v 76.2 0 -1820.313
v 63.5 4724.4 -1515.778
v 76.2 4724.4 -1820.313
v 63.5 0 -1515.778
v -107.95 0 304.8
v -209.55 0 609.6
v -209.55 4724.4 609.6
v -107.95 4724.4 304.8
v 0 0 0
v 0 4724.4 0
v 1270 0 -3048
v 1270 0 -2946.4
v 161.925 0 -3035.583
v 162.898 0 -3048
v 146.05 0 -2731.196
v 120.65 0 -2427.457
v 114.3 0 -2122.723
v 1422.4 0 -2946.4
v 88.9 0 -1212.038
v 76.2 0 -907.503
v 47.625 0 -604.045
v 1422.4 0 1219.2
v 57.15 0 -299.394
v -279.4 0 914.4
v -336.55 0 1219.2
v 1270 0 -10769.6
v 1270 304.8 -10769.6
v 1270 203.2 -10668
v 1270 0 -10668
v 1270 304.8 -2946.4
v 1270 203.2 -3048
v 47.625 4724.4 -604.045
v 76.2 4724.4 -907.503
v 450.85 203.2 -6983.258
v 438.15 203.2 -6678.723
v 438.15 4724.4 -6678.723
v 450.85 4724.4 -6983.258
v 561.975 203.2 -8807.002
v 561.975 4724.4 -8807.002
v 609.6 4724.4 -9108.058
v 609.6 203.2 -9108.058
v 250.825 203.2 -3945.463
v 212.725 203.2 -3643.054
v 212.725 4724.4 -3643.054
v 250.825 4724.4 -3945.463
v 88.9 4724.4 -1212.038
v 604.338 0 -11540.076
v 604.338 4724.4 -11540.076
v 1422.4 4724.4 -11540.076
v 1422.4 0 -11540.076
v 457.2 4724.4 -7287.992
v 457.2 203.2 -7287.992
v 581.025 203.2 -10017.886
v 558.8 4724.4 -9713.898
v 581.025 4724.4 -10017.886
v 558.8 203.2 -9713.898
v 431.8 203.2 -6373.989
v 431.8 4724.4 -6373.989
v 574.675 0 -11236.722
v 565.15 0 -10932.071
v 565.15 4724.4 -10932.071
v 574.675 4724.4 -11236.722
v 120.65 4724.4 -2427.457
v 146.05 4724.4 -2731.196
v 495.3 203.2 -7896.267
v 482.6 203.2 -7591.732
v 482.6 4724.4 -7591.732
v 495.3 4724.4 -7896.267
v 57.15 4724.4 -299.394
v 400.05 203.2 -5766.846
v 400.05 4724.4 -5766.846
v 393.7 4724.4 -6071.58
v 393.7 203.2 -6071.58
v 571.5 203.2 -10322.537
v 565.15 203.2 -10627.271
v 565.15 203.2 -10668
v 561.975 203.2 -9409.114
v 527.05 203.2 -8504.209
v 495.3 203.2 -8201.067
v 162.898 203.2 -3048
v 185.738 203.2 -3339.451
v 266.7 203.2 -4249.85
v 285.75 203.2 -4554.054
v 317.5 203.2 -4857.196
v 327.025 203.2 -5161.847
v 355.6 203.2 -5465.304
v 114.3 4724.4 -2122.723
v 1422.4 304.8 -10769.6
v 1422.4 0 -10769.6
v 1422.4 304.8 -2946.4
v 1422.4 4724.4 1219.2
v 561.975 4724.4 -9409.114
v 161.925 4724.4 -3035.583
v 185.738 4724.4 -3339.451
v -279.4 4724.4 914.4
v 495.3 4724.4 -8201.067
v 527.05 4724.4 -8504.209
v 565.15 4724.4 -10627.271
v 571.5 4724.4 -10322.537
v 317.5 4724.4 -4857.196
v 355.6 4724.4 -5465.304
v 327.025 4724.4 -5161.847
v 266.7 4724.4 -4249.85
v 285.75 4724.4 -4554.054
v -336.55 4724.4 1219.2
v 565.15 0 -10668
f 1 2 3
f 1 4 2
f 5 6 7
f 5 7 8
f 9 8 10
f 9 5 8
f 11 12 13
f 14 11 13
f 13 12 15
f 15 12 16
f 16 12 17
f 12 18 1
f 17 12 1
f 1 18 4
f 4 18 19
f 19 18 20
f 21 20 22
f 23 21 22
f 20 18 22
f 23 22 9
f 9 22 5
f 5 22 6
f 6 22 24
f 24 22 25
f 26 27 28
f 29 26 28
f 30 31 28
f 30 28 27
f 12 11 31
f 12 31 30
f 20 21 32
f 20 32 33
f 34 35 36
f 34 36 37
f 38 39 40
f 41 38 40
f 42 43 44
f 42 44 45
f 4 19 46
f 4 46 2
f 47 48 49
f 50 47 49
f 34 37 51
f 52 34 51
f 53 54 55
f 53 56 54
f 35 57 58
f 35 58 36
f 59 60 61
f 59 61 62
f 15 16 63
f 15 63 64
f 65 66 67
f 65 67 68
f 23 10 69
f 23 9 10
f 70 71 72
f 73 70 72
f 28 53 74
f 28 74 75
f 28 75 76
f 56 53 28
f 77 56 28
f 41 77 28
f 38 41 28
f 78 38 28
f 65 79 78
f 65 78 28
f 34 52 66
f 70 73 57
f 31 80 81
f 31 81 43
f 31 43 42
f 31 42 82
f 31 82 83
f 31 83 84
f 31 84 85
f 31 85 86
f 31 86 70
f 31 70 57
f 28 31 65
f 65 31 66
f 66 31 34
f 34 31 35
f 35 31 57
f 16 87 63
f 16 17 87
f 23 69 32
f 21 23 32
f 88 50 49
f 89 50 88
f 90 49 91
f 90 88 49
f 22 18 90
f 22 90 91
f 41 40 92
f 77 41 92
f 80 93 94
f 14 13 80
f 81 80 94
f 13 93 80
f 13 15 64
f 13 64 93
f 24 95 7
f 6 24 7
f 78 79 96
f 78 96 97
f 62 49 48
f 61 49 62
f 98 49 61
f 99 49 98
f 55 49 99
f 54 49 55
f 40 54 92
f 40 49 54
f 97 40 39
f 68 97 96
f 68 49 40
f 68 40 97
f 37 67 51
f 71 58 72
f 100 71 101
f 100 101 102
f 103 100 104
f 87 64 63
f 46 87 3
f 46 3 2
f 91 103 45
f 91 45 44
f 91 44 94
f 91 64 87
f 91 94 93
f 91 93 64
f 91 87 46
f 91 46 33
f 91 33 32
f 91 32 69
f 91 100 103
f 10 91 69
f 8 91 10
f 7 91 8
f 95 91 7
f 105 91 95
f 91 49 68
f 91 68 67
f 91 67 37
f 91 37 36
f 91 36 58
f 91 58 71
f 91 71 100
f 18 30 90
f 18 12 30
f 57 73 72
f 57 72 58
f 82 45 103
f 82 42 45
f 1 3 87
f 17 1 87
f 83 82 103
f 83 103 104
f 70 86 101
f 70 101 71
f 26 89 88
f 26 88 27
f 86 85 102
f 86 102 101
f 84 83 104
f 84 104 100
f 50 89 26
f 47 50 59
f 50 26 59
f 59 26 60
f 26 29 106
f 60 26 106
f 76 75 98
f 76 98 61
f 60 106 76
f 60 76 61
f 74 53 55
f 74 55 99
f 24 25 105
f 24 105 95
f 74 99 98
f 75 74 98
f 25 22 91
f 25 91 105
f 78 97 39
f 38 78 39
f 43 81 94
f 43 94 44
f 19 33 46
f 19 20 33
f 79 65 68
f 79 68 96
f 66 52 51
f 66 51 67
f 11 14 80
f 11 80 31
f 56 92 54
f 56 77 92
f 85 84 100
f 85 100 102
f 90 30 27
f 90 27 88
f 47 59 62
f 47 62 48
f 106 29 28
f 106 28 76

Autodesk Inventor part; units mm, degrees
ref_plane "XZ Plane" through (0, 0, 0) normal (0, 1, 0) x (-1, 0, 0)
sketch "Sketch1" plane through (0, 0, 0) normal (0, 1, 0) x (-1, 0, 0)
  line L0 (368.3, 1219.2) -> (368.3, -11582.4)
  line L1 (368.3, 1219.2) -> (336.55, 1219.2)
  line L2 (336.55, 1219.2) -> (279.4, 914.4)
  line L3 (279.4, 914.4) -> (209.55, 609.6)
  line L4 (209.55, 609.6) -> (107.95, 304.8)
  line L5 (107.95, 304.8) -> (0, 0)
  line L6 (0, 0) -> (-57.15, -299.3943)
  line L7 (-57.15, -299.3943) -> (-47.625, -604.0454)
  line L8 (-47.625, -604.0454) -> (-76.2, -907.503)
  line L9 (-76.2, -907.503) -> (-88.9, -1212.0383)
  line L10 (-88.9, -1212.0383) -> (-63.5, -1515.7781)
  line L11 (-63.5, -1515.7781) -> (-76.2, -1820.3134)
  line L12 (-76.2, -1820.3134) -> (-114.3, -2122.7228)
  line L13 (-114.3, -2122.7228) -> (-120.65, -2427.4566)
  line L14 (-120.65, -2427.4566) -> (-146.05, -2731.1964)
  line L15 (-146.05, -2731.1964) -> (-161.925, -3035.5828)
  line L16 (-161.925, -3035.5828) -> (-185.7375, -3339.4512)
  line L17 (-185.7375, -3339.4512) -> (-212.725, -3643.054)
  line L18 (-212.725, -3643.054) -> (-250.825, -3945.4634)
  line L19 (-250.825, -3945.4634) -> (-266.7, -4249.8497)
  line L20 (-266.7, -4249.8497) -> (-285.75, -4554.0538)
  line L21 (-285.75, -4554.0538) -> (-317.5, -4857.1957)
  line L22 (-317.5, -4857.1957) -> (-327.025, -5161.8468)
  line L23 (-327.025, -5161.8468) -> (-355.6, -5465.3044)
  line L24 (-355.6, -5465.3044) -> (-400.05, -5766.8458)
  line L25 (-400.05, -5766.8458) -> (-393.7, -6071.5797)
  line L26 (-393.7, -6071.5797) -> (-431.8, -6373.9891)
  line L27 (-431.8, -6373.9891) -> (-438.15, -6678.7229)
  line L28 (-438.15, -6678.7229) -> (-450.85, -6983.2582)
  line L29 (-450.85, -6983.2582) -> (-457.2, -7287.9921)
  line L30 (-457.2, -7287.9921) -> (-482.6, -7591.7319)
  line L31 (-482.6, -7591.7319) -> (-495.3, -7896.2672)
  line L32 (-495.3, -7896.2672) -> (-495.3, -8201.0672)
  line L33 (-495.3, -8201.0672) -> (-527.05, -8504.209)
  line L34 (-527.05, -8504.209) -> (-561.975, -8807.0015)
  line L35 (-561.975, -8807.0015) -> (-609.6, -9108.0578)
  line L36 (-609.6, -9108.0578) -> (-561.975, -9409.1141)
  line L37 (-561.975, -9409.1141) -> (-558.8, -9713.8976)
  line L38 (-558.8, -9713.8976) -> (-581.025, -10017.8862)
  line L39 (-581.025, -10017.8862) -> (-571.5, -10322.5373)
  line L40 (-571.5, -10322.5373) -> (-565.15, -10627.2712)
  line L41 (-565.15, -10627.2712) -> (-565.15, -10932.0712)
  line L42 (-565.15, -10932.0712) -> (-574.675, -11236.7223)
  line L43 (-574.675, -11236.7223) -> (-604.3377, -11540.0755)
  line L44 (-1422.4, 1219.2) -> (336.55, 1219.2)
  line L45 (-604.3377, -11540.0755) -> (-1422.4, -11540.0755)
  line L46 (-1422.4, -11540.0755) -> (-1422.4, 1219.2)
  point P0 (368.3, -5181.6)
  dimension "d4" = 1219.2
  dimension "d5" = 11582.4
  dimension "d6" = 368.3
  dimension "d8" = 31.75
  dimension "d10" = 304.8
  dimension "d14" = 88.9
  dimension "d15" = 304.8
  dimension "d16" = 304.8
  dimension "d17" = 260.35
  dimension "d18" = 158.75
  dimension "d20" = 304.8
  dimension "d21" = 425.45
  dimension "d22" = 304.8
  dimension "d23" = 415.925
  dimension "d24" = 304.8
  dimension "d25" = 444.5
  dimension "d26" = 304.8
  dimension "d27" = 457.2
  dimension "d28" = 304.8
  dimension "d29" = 431.8
  dimension "d30" = 304.8
  dimension "d31" = 444.5
  dimension "d32" = 304.8
  dimension "d33" = 482.6
  dimension "d34" = 304.8
  dimension "d35" = 488.95
  dimension "d36" = 304.8
  dimension "d37" = 514.35
  dimension "d39" = 304.8
  dimension "d40" = 530.225
  dimension "d41" = 304.8
  dimension "d42" = 554.0375
  dimension "d43" = 304.8
  dimension "d44" = 581.025
  dimension "d45" = 304.8
  dimension "d46" = 619.125
  dimension "d47" = 304.8
  dimension "d48" = 635
  dimension "d49" = 304.8
  dimension "d50" = 654.05
  dimension "d51" = 304.8
  dimension "d52" = 685.8
  dimension "d53" = 304.8
  dimension "d54" = 695.325
  dimension "d55" = 304.8
  dimension "d56" = 723.9
  dimension "d57" = 304.8
  dimension "d58" = 768.35
  dimension "d59" = 304.8
  dimension "d60" = 762
  dimension "d61" = 304.8
  dimension "d62" = 800.1
  dimension "d63" = 304.8
  dimension "d64" = 806.45
  dimension "d65" = 304.8
  dimension "d66" = 819.15
  dimension "d67" = 304.8
  dimension "d68" = 825.5
  dimension "d69" = 304.8
  dimension "d70" = 850.9
  dimension "d71" = 304.8
  dimension "d72" = 863.6
  dimension "d73" = 304.8
  dimension "d74" = 863.6
extrude "Extrusion1" add sketch "Sketch1" along normal blind 4724.4
ref_plane "Work Plane1" through (0, 0, 0) normal (1, 0, 0) x (0, 1, 0)
sketch "Sketch2" plane through (0, 0, 0) normal (0, -1, 0) x (1, 0, 0)
  line L0 (1422.4, 1219.2) -> (1422.4, -11540.0755) projected
  line L1 (1422.4, -10769.6) -> (1270, -10769.6)
  line L2 (1270, -10769.6) -> (1270, -2946.4)
  line L3 (1270, -2946.4) -> (1422.4, -2946.4)
  line L4 (1422.4, -2946.4) -> (1422.4, -10769.6)
  point P0 (0, 0)
  dimension "d101" = 2946.4
  dimension "d102" = 152.4
  dimension "d103" = 7823.2
extrude "Extrusion2" cut sketch "Sketch2" against normal blind 304.8
sketch "Sketch3" plane through (0, 0, 0) normal (0, -1, 0) x (1, 0, 0)
  line L0 (1270, -10668) -> (-142.875, -10668)
  line L1 (-142.875, -10668) -> (-142.875, -3048)
  line L2 (-142.875, -3048) -> (1270, -3048)
  line L3 (1270, -3048) -> (1270, -10668)
  line L4 (1422.4, -10769.6) -> (1270, -10769.6) projected
  line L5 (1270, -10769.6) -> (1270, -2946.4) projected
  line L6 (1270, -2946.4) -> (1422.4, -2946.4) projected
  line L7 (185.7375, -3339.4512) -> (161.925, -3035.5828) projected
  point P0 (0, 0)
  point P1 (162.8981, -3048)
  dimension "d106" = 101.6
  dimension "d107" = 101.6
  dimension "d111" = 1412.875
extrude "Extrusion3" cut sketch "Sketch3" against normal blind 203.2
ref_plane "Work Plane2" through (88.9, 4724.4, -1212.0383) normal (1, 0, 0) x (0, 1, 0)
properties part number "Elevation_Profile_Extending_NW_From_N_Edge_Of_Foundation_Where_Foundation_Meets_Ground"
